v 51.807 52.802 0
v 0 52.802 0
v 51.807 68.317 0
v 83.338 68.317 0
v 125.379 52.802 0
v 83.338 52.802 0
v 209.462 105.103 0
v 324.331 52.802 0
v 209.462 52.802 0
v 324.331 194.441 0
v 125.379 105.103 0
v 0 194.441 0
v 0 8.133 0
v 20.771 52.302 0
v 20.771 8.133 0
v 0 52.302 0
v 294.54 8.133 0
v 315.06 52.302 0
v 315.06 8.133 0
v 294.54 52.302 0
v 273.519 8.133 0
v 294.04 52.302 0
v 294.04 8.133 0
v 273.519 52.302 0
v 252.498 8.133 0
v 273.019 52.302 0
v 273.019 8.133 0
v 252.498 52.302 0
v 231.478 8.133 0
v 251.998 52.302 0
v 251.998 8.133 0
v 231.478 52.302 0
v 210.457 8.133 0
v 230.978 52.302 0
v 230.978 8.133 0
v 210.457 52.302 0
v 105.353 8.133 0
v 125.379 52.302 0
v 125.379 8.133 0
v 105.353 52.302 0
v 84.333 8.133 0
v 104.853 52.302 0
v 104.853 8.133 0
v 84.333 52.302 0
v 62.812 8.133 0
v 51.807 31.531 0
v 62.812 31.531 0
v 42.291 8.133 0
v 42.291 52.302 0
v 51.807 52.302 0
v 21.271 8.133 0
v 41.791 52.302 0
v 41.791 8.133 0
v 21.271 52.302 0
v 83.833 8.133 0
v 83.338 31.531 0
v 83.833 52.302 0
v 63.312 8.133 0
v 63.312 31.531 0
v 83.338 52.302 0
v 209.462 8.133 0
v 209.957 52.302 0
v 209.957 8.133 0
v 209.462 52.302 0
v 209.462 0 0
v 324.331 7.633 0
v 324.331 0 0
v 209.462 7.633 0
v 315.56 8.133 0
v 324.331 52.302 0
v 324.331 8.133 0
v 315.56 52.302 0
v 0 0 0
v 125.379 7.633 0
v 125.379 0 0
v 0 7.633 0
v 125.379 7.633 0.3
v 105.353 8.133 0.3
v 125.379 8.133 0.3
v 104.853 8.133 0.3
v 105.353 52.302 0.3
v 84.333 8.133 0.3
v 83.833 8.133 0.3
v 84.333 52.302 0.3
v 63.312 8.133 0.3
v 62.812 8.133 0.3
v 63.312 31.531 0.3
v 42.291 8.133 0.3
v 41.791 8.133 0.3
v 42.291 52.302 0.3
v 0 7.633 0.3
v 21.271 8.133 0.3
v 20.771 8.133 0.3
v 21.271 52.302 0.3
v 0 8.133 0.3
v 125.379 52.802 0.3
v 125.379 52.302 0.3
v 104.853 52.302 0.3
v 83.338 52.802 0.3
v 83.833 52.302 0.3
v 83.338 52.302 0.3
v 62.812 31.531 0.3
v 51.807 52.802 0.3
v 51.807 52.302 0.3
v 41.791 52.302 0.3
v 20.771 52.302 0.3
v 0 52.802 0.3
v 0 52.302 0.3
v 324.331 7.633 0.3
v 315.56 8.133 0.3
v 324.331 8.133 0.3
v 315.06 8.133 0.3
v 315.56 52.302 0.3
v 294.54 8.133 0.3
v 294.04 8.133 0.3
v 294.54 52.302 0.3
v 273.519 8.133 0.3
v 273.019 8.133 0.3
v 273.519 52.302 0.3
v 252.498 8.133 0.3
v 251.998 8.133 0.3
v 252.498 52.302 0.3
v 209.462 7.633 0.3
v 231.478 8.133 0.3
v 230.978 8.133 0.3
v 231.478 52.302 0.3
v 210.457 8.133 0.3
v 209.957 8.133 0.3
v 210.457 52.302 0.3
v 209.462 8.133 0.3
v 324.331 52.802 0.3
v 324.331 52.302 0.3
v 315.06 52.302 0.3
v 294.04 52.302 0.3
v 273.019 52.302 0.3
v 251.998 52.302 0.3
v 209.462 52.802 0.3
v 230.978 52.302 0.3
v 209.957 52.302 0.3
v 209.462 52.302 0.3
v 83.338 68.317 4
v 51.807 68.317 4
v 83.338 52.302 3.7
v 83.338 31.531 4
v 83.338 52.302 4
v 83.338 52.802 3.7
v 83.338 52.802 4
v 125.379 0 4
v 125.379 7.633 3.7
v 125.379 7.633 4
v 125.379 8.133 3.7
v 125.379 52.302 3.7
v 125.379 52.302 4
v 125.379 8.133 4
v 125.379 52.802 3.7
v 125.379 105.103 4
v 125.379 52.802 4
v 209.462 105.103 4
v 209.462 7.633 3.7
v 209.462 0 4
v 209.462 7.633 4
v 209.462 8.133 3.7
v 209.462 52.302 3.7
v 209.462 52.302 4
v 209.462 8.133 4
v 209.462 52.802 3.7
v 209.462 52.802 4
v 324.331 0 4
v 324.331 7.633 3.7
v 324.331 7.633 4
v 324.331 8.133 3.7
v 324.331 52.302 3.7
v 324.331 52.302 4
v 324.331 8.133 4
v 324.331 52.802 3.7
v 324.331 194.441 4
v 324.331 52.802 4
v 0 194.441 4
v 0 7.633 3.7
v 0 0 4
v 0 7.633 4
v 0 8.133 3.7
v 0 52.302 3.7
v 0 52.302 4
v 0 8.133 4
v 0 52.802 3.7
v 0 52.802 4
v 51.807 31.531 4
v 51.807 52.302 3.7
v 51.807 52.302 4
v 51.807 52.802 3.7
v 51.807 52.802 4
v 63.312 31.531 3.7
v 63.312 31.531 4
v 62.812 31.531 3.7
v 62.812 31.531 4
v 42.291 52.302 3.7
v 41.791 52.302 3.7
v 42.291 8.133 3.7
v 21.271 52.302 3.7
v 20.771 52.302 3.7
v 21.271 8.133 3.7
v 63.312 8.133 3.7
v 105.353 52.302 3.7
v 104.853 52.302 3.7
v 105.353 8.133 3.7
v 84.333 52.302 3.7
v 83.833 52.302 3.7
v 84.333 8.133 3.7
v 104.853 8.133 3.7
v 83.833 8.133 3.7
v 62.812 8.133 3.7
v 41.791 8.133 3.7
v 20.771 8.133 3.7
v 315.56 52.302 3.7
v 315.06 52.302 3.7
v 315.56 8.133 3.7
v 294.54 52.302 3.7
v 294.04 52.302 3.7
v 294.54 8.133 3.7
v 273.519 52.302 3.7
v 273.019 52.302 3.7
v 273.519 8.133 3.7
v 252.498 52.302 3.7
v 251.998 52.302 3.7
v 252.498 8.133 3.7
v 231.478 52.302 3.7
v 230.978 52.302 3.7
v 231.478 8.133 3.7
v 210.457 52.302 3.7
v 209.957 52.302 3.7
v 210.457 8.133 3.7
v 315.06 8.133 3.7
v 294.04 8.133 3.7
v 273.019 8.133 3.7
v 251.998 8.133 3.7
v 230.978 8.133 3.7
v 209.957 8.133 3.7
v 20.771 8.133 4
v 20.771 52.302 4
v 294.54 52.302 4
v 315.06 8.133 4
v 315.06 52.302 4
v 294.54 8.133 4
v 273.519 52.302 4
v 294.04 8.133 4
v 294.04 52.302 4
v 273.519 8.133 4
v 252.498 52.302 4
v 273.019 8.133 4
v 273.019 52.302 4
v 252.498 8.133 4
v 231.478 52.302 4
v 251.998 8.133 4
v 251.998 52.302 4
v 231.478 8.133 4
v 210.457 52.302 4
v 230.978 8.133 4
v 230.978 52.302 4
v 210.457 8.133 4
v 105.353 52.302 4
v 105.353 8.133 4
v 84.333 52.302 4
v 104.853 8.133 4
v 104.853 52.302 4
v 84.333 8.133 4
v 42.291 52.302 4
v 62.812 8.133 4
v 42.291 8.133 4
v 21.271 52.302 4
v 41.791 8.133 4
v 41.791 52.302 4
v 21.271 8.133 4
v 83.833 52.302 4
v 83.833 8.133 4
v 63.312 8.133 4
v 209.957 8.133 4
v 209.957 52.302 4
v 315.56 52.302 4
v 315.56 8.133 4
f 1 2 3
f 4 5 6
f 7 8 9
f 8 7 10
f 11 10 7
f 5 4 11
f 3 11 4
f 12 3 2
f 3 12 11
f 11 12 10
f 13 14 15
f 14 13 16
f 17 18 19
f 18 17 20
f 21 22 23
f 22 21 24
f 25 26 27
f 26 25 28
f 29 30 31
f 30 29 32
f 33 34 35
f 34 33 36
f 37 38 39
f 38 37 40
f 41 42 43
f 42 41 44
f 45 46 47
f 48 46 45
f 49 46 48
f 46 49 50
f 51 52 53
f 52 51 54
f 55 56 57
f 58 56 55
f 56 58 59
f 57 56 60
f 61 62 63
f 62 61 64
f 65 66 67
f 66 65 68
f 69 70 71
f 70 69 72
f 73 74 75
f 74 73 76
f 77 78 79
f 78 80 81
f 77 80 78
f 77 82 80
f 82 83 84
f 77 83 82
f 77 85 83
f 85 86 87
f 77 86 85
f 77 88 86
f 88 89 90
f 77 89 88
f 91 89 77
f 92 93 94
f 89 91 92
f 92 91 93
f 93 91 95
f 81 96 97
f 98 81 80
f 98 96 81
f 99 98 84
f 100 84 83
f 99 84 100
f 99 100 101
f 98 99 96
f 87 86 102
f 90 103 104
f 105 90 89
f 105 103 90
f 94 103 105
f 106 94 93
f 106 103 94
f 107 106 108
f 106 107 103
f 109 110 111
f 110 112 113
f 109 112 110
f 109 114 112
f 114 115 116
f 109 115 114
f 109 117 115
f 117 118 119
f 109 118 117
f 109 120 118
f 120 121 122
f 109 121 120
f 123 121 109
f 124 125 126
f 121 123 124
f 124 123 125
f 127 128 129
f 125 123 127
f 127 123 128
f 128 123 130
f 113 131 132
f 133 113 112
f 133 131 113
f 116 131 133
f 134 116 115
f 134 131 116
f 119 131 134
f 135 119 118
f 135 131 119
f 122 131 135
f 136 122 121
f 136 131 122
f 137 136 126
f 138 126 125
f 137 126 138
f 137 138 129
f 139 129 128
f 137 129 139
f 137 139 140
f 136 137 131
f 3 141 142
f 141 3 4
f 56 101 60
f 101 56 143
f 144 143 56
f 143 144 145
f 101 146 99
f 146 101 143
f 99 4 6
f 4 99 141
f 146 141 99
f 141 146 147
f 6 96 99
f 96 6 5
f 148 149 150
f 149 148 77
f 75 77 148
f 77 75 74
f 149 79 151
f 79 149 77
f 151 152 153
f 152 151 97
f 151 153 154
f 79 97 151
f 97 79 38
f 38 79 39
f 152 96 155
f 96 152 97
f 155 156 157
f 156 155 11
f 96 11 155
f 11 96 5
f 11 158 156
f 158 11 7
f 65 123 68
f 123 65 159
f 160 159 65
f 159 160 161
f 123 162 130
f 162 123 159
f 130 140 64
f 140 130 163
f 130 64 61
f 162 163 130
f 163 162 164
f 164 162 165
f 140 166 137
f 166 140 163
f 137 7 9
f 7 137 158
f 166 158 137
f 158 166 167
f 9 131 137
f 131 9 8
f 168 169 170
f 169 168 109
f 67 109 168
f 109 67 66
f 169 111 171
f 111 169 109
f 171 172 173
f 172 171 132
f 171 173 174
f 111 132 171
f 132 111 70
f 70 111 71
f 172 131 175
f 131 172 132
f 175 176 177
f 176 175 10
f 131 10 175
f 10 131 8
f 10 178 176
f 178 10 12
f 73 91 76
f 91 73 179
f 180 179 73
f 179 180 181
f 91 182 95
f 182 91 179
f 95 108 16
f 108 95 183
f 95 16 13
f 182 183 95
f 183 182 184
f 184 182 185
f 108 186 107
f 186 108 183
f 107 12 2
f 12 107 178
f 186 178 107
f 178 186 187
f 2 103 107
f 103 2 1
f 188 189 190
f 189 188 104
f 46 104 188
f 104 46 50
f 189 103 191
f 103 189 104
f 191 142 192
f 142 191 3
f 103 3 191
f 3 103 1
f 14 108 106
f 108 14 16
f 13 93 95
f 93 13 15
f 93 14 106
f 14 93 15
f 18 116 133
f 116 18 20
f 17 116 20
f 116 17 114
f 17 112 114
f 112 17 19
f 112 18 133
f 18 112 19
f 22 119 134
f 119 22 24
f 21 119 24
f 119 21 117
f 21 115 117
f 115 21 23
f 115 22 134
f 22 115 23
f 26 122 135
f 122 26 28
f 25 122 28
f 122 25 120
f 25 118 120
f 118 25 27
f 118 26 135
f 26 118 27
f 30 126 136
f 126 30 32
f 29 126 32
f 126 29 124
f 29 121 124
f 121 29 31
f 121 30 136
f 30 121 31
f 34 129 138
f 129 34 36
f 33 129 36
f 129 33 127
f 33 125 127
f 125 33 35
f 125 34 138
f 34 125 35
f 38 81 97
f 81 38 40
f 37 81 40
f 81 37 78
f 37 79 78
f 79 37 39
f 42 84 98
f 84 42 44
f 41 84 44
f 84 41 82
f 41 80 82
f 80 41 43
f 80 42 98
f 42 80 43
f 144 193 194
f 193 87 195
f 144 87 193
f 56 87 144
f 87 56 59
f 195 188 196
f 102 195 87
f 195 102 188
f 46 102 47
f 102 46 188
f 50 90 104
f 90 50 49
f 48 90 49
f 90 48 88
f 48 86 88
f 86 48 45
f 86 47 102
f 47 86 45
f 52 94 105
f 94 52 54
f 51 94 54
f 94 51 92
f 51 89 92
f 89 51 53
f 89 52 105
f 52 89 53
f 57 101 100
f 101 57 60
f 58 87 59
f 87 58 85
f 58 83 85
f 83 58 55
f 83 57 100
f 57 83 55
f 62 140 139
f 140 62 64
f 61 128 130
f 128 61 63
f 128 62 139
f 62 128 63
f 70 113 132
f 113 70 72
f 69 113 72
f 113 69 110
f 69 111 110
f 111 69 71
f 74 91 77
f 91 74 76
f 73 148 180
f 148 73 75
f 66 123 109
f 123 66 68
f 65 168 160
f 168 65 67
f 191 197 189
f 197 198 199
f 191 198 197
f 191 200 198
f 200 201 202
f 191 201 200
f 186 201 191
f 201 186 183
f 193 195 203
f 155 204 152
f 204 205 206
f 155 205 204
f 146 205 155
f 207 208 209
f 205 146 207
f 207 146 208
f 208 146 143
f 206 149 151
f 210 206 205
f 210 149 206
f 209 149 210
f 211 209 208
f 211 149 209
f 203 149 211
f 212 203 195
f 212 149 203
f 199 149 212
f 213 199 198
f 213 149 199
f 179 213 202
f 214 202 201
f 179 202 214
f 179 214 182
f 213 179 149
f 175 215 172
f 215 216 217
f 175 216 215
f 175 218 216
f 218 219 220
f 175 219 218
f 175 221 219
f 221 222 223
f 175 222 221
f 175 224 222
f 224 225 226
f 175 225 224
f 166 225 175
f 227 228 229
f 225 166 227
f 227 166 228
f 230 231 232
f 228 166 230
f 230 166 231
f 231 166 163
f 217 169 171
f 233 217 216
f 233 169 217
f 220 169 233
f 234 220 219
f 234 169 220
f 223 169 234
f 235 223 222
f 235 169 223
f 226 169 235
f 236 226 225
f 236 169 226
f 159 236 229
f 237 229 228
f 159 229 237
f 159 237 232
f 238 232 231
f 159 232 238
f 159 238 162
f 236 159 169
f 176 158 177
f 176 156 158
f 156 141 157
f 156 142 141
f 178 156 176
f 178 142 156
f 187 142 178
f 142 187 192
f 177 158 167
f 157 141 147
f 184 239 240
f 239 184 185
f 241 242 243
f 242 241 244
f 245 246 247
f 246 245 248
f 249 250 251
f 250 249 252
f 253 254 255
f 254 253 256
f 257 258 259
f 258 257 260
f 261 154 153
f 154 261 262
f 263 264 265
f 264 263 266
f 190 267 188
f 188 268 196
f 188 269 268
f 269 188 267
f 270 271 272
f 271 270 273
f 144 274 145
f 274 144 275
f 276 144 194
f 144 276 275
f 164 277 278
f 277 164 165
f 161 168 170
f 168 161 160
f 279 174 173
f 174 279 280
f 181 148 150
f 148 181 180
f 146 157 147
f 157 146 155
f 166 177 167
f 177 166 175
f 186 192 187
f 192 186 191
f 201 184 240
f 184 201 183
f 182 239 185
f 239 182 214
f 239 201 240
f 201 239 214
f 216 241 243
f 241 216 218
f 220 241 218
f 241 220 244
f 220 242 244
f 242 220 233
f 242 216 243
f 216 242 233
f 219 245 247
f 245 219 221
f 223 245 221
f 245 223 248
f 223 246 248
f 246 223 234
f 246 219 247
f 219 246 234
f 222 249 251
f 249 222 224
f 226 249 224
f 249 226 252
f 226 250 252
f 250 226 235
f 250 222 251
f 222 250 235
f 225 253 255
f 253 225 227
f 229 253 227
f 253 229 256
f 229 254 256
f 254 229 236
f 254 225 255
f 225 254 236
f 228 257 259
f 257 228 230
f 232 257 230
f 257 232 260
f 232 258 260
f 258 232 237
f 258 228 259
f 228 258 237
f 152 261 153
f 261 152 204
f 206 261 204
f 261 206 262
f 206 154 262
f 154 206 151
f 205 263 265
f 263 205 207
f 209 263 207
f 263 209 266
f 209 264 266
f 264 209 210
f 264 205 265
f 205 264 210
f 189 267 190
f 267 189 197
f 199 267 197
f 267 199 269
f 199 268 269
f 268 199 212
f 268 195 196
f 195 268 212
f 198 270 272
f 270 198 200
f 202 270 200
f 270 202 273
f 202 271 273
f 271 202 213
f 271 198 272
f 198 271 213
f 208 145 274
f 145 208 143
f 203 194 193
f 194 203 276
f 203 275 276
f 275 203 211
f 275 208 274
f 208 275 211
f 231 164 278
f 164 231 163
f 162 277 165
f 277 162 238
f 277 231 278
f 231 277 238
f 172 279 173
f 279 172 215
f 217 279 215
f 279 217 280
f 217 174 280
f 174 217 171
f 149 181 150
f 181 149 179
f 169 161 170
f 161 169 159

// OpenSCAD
// file: ../janesville_common.scad
// =====================================================================
//  CMSP Janesville WI Station - shared settings and footprint
//  Frost & Granger, 1902 as-built prints.  G scale 1:29.  Units: model mm.
//  Every other .scad file in this project does:  include <../janesville_common.scad>
// =====================================================================

// ---------- scale ----------
SCALE = 29;
function ft(f, i = 0) = (f * 12 + i) * 25.4 / SCALE;   // real feet + inches -> model mm

// ---------- printer ----------
// "P1S"  = Bambu Lab P1S, 256 x 256 x 256 bed  (use 252 usable)
// "GIGA" = Tom's large-format printer, 800 x 800 x 1000 (use 780 usable)
PRINTER = "P1S";
function bed_for(p) = p == "GIGA" ? [780, 780, 980] : [252, 252, 250];
BED = bed_for(PRINTER);

// ---------- colors (preview only; print color = filament) ----------
PULLMAN_GREEN = "#3B4A2C";   // windows, doors, trim
BRICK_RED     = "#8E3B2C";
MORTAR_WHITE  = "#F2EFE6";
STONE_BUFF    = "#C9B79C";

// ---------- joints between printed sections ----------
PIN_D      = 3.0;    // alignment pin (3 mm PETG filament stub or steel pin)
PIN_CLEAR  = 0.25;   // hole oversize
PIN_DEPTH  = 6;      // hole depth each side of a cut
CUT_BAND   = 5;      // solid band each side of a cut so pins land in plastic

// ---------- NeoPixel wiring ----------
WIRE_CHANNEL = [10, 6];   // width x height of notches in under-floor ribs (3-wire bus)
FEED_HOLE_D  = 8;         // hole up through the floor into each room

// ---------- coordinates ----------
// x runs west -> east along the track.  x = 0 at the west end wall line.
// y = 0 at the main track-side wall line, +y toward town.
// Dimensions are to the MAIN WALL LINE (as the drawings are figured).

// Main building, B2077 / B2076.  Overall 128'-5".
X_WEST_END   = 0;
X_PAV_W      = ft(38, 9);                 // general waiting room wing  38'-9"
X_PAV_E      = X_PAV_W + ft(22, 6);       // center pavilion            22'-6"
X_SMOKE_E    = X_PAV_E + ft(36, 10);      // smoking room wing          36'-10"
X_MAIN_E     = X_SMOKE_E + ft(30, 4);     // lunch room wing            30'-4"  -> 128'-5"
MAIN_DEPTH   = ft(32, 0);                 // west wing, pavilion, smoking wing

// Lunch-room wing is narrower: 25'-4" deep (7'-2" + 11'-0" + 7'-2"),
// set back 1'-5" on the track side and 5'-3" on the town side.  VERIFY vs B2078/B2079.
LUNCH_Y0     = ft(1, 5);
LUNCH_Y1     = LUNCH_Y0 + ft(25, 4);

// Pavilion projections.  APPROXIMATE - verify against elevations.
PORCH_PROJ   = ft(3, 6);    // town side: two 6'-9" blocks project 3'-6"
PORCH_W      = ft(9, 0);    // recessed porch between them (open to y = MAIN_DEPTH)
BAY_PROJ     = ft(3, 0);    // track side: canted ticket-office bay
BAY_W_WALL   = ft(15, 6);   // bay width at the wall
BAY_W_FRONT  = ft(9, 6);    // bay width at its face
BAY_CX       = ft(46, 11);  // bay center from west end (B2077 track-side chain), not centered on the pavilion

// Baggage & express building, B2077: 47'-2" x 25'-4", 42'-0" east of the main building.
// Track wall assumed in line with the lunch wing.  VERIFY.
X_BAG_W      = X_MAIN_E + ft(42, 0);
X_BAG_E      = X_BAG_W + ft(47, 2);
BAG_Y0       = LUNCH_Y0;
BAG_Y1       = BAG_Y0 + ft(25, 4);

// Wall thicknesses (model mm)
T_MAIN  = 6.0;     // main block exterior walls (real 1'-5" = 14.9 mm, thinned for printing)
T_LIGHT = 5.0;     // lunch wing, porch, bay, baggage building

// Heights (B2082 / B2078)
FLOOR_Z      = ft(1, 9);    // finished floor above finished grade
WALL_H       = ft(19, 0);   // floor to cornice, town side
SILL_H       = ft(2, 9);    // floor to top of window sill
BASE_PROJ    = ft(0, 4);    // stone base / water table projects past the wall line

// ---------- footprints (2D) ----------
module footprint_main() {
    union() {
        translate([X_WEST_END, 0]) square([X_SMOKE_E - X_WEST_END, MAIN_DEPTH]);
        translate([X_SMOKE_E, LUNCH_Y0]) square([X_MAIN_E - X_SMOKE_E, LUNCH_Y1 - LUNCH_Y0]);
        // town-side pavilion blocks with the recessed porch between them
        difference() {
            translate([X_PAV_W, MAIN_DEPTH - 0.01]) square([X_PAV_E - X_PAV_W, PORCH_PROJ]);
            translate([(X_PAV_W + X_PAV_E - PORCH_W) / 2, MAIN_DEPTH - 1]) square([PORCH_W, PORCH_PROJ + 2]);
        }
        // track-side canted bay
        let(cx = BAY_CX)
        polygon([[cx - BAY_W_WALL / 2, 0.01], [cx + BAY_W_WALL / 2, 0.01],
                 [cx + BAY_W_FRONT / 2, -BAY_PROJ], [cx - BAY_W_FRONT / 2, -BAY_PROJ]]);
    }
}

module footprint_baggage() {
    translate([X_BAG_W, BAG_Y0]) square([X_BAG_E - X_BAG_W, BAG_Y1 - BAG_Y0]);
}
// main file
// =====================================================================
//  Interior walls (partitions) from B2077 Plan of Main Floor, 1902
//  Printed flat. Both faces carry the varnished-oak wainscot noted on the plan:
//  baseboard line, cap rail at 5'-0", panel stiles every 2'-0"; plaster above.
//  Brick partitions run full height (18'-6"); stud partitions 10'-0" (ceilings come later).
//
//  interior_part(name, tile, bed)   interior_place(name)   interior_list()
//  interior_count(name, bed)        interior_splices(name, bed) / interior_splice_count(...)
// =====================================================================
include <../janesville_common.scad>

INT  = "W1_waiting_pavilion";   // when opened directly
TILE = -1;
VIEW = "flat";                  // "flat" or "placed"

T_BRICK = 4.0;      // brick partition (real 13")
T_STUD  = 3.0;      // stud partition (real 6")
WAIN_H  = 5.0;      // wainscot cap rail height, ft (B2082 lunch room section)
BASE_H  = 0.75;     // baseboard top, ft
STILE   = 2.0;      // panel stile spacing, ft
GROOVE  = 0.5;  GROOVE_D = 0.3;
SPLICE_W = 16; SPLICE_T = 1.0; SPLICE_CLEAR = 0.3;
HIGH = 18.5; LOW = 10;
$fn = 32;
L_MAIN_FT = 98 + 1/12;

// opening helpers: [center_ft along wall from start point, width_ft, bottom_ft, top_ft]
function O(c, w, b, t) = [c, w, b, t];
function DR(c, w = 2.83, t = 7.5) = [c, w, 0, t];

// lunch wing and baggage building interior faces (mm)
LW_Y0 = LUNCH_Y0 + 5;  LW_Y1 = LUNCH_Y1 - 5;
BG_Y0 = BAG_Y0 + 5;    BG_Y1 = BAG_Y1 - 5;
YT = T_MAIN; YN = MAIN_DEPTH - T_MAIN;        // main block inside faces, track / town

// [name, start [x,y] mm, end [x,y] mm, height_ft, thickness, openings]
// Openings are measured from the START point (ft).
INT_TABLE = [
  // general waiting room | pavilion  (x = 40'-3")
  ["W1_waiting_pavilion", [ft(40.25), YT], [ft(40.25), YN], HIGH, T_BRICK,
     [O(7 - T_MAIN / ft(1), 3, 3, 6.5),          // ticket window into the ticket office
      O(16.5 - T_MAIN / ft(1), 8, 0, 10)]],      // wide passage opening (I-beams over)
  // pavilion | smoking room  (x = 60'-3")
  ["W2_pavilion_smoking", [ft(60.25), YT], [ft(60.25), YN], HIGH, T_BRICK,
     [O(16.5 - T_MAIN / ft(1), 8, 0, 10)]],
  // smoking room | men's toilet + lunch-counter annex  (x = 87'-4": smoking room 26 ft inside)
  ["S1_smoking_east", [ft(87.35), YT], [ft(87.35), YN], HIGH, T_BRICK,
     [DR(7.5 - T_MAIN / ft(1), 5.67, 7.5),       // two 2'-10" doors to the lunch-counter annex
      DR(25 - T_MAIN / ft(1), 2.67)]],           // men's toilet door
  // ticket office + train order | passage  (y = 11'-9")
  ["P1_ticket_passage", [ft(40.25) + T_BRICK / 2, ft(11.75)], [ft(60.25) - T_BRICK / 2, ft(11.75)], LOW, T_STUD,
     [O(5, 4, 3, 6.5),                            // ticket counter window to the passage
      DR(16, 2.5)]],                              // door into the train-order office
  // ticket office | train order  (x = 55'-0")
  ["P2_ticket_trainorder", [ft(55), YT], [ft(55), ft(11.75) - T_STUD / 2], LOW, T_STUD,
     [DR(8, 2.5)]],
  // passage | women's toilet + vestibule  (y = 21'-3")
  ["P3_passage_town", [ft(40.25) + T_BRICK / 2, ft(21.25)], [ft(60.25) - T_BRICK / 2, ft(21.25)], LOW, T_STUD,
     [DR(4.5, 2.5),                               // women's toilet door
      O(13.5, 8, 0, 8.5)]],                       // open to the vestibule
  // women's toilet | vestibule  (x = 49'-6")
  ["P4_toilet_vestibule", [ft(49.5), ft(21.25) + T_STUD / 2], [ft(49.5), YN], LOW, T_STUD, []],
  // men's toilet | lunch-counter annex  (y = 16'-0")
  ["S2_menstoilet", [ft(96.3) + 0.3, ft(16)], [ft(L_MAIN_FT) - T_MAIN, ft(16)], LOW, T_STUD, []],     // short stub: the chimney base fills the rest of this line
  // kitchen | lunch room  (x = 116'-0")
  ["K1_kitchen", [ft(116), ft(13.5)], [ft(116), LW_Y1], 9.5, T_STUD,
     [DR(6.25, 2.67)]],
  // baggage room | express room
  ["B1_baggage_express", [X_BAG_W + ft(30.58), BG_Y0], [X_BAG_W + ft(30.58), BG_Y1], 10.5, T_BRICK,
     [DR(17.5, 3, 7.5)]]
];


function irow(n) = INT_TABLE[search([n], INT_TABLE)[0]];
function interior_list() = [for (r = INT_TABLE) r[0]];
function i_len(r) = norm(r[2] - r[1]);
function i_h(r)   = ft(r[3]);
function i_cuts(r, bed) = let(L = i_len(r), H = i_h(r), nx = ceil(L / (bed[0] - 2)), ny = ceil(H / (bed[1] - 2)))
    [nx, ny, [for (i = [1 : max(1, nx - 1)]) if (nx > 1) i * L / nx], [for (j = [1 : max(1, ny - 1)]) if (ny > 1) j * H / ny]];
function interior_count(n, bed) = let(c = i_cuts(irow(n), bed)) c[0] * c[1];
function interior_splice_count(n, bed) = len(i_cuts(irow(n), bed)[2]) * i_cuts(irow(n), bed)[1];
function i_splice_len(r) = min(i_h(r) - 20, ft(WAIN_H) - 8);

module i_openings2d(r) for (o = r[5]) {
    c = ft(o[0]); w = ft(o[1]); b = ft(o[2]); t = ft(o[3]);
    translate([c - w / 2, b - (b == 0 ? 1 : 0)]) square([w, t - b + (b == 0 ? 1 : 0)]);
}
module wainscot2d(L) {
    translate([-1, ft(WAIN_H) - GROOVE / 2]) square([L + 2, GROOVE]);       // cap rail
    translate([-1, ft(BASE_H) - GROOVE / 2]) square([L + 2, GROOVE]);       // baseboard
    for (u = [ft(STILE) : ft(STILE) : L - 2])
        translate([u - GROOVE / 2, ft(BASE_H)]) square([GROOVE, ft(WAIN_H - BASE_H)]);
}
function i_layers(r) = [0, GROOVE_D, SPLICE_T, r[4] - GROOVE_D, r[4]];

module i_region2d(r, k, bed) {
    L = i_len(r); H = i_h(r); cu = i_cuts(r, bed);
    difference() {
        square([L, H]);
        i_openings2d(r);
        if (k == 0 || k == 3) wainscot2d(L);
        if (k <= 1) for (c = cu[2]) translate([c - (SPLICE_W + SPLICE_CLEAR) / 2, 4])
            square([SPLICE_W + SPLICE_CLEAR, i_splice_len(r) + SPLICE_CLEAR]);
    }
}

module interior_part(n, tile = -1, bed = BED, only = -1) {
    r = irow(n); L = i_len(r); H = i_h(r); z = i_layers(r); cu = i_cuts(r, bed);
    nx = cu[0]; xc = cu[2]; yc = cu[3];
    ix = tile < 0 ? 0 : tile % nx; iy = tile < 0 ? 0 : floor(tile / nx);
    x0 = (tile < 0 || ix == 0) ? -2 : xc[ix - 1]; x1 = (tile < 0 || ix == nx - 1) ? L + 2 : xc[ix];
    y0 = (tile < 0 || iy == 0) ? -2 : yc[iy - 1]; y1 = (tile < 0 || iy == cu[1] - 1) ? H + 2 : yc[iy];
    for (k = [0 : 3]) if (only < 0 || only == k) translate([0, 0, z[k]]) linear_extrude(z[k + 1] - z[k])
        intersection() { i_region2d(r, k, bed); translate([x0, y0]) square([x1 - x0, y1 - y0]); }
}

module interior_splices(n, bed = BED) {
    r = irow(n); m = interior_splice_count(n, bed);
    if (m > 0) for (i = [0 : m - 1]) translate([i * (SPLICE_W + 4), 0, 0]) cube([SPLICE_W, i_splice_len(r), SPLICE_T - 0.1]);
}

module interior_place(n) {
    r = irow(n); d = r[2] - r[1]; a = atan2(d[1], d[0]); T = r[4];
    translate([r[1][0], r[1][1], FLOOR_Z]) rotate([0, 0, a]) rotate([90, 0, 0]) translate([0, 0, -T / 2]) interior_part(n);
}

LAYER = -1;   // cloud export helper
if (VIEW == "placed") for (n = interior_list()) interior_place(n);
else if (VIEW == "splices") interior_splices(INT, BED);
else interior_part(INT, TILE, BED, LAYER);
